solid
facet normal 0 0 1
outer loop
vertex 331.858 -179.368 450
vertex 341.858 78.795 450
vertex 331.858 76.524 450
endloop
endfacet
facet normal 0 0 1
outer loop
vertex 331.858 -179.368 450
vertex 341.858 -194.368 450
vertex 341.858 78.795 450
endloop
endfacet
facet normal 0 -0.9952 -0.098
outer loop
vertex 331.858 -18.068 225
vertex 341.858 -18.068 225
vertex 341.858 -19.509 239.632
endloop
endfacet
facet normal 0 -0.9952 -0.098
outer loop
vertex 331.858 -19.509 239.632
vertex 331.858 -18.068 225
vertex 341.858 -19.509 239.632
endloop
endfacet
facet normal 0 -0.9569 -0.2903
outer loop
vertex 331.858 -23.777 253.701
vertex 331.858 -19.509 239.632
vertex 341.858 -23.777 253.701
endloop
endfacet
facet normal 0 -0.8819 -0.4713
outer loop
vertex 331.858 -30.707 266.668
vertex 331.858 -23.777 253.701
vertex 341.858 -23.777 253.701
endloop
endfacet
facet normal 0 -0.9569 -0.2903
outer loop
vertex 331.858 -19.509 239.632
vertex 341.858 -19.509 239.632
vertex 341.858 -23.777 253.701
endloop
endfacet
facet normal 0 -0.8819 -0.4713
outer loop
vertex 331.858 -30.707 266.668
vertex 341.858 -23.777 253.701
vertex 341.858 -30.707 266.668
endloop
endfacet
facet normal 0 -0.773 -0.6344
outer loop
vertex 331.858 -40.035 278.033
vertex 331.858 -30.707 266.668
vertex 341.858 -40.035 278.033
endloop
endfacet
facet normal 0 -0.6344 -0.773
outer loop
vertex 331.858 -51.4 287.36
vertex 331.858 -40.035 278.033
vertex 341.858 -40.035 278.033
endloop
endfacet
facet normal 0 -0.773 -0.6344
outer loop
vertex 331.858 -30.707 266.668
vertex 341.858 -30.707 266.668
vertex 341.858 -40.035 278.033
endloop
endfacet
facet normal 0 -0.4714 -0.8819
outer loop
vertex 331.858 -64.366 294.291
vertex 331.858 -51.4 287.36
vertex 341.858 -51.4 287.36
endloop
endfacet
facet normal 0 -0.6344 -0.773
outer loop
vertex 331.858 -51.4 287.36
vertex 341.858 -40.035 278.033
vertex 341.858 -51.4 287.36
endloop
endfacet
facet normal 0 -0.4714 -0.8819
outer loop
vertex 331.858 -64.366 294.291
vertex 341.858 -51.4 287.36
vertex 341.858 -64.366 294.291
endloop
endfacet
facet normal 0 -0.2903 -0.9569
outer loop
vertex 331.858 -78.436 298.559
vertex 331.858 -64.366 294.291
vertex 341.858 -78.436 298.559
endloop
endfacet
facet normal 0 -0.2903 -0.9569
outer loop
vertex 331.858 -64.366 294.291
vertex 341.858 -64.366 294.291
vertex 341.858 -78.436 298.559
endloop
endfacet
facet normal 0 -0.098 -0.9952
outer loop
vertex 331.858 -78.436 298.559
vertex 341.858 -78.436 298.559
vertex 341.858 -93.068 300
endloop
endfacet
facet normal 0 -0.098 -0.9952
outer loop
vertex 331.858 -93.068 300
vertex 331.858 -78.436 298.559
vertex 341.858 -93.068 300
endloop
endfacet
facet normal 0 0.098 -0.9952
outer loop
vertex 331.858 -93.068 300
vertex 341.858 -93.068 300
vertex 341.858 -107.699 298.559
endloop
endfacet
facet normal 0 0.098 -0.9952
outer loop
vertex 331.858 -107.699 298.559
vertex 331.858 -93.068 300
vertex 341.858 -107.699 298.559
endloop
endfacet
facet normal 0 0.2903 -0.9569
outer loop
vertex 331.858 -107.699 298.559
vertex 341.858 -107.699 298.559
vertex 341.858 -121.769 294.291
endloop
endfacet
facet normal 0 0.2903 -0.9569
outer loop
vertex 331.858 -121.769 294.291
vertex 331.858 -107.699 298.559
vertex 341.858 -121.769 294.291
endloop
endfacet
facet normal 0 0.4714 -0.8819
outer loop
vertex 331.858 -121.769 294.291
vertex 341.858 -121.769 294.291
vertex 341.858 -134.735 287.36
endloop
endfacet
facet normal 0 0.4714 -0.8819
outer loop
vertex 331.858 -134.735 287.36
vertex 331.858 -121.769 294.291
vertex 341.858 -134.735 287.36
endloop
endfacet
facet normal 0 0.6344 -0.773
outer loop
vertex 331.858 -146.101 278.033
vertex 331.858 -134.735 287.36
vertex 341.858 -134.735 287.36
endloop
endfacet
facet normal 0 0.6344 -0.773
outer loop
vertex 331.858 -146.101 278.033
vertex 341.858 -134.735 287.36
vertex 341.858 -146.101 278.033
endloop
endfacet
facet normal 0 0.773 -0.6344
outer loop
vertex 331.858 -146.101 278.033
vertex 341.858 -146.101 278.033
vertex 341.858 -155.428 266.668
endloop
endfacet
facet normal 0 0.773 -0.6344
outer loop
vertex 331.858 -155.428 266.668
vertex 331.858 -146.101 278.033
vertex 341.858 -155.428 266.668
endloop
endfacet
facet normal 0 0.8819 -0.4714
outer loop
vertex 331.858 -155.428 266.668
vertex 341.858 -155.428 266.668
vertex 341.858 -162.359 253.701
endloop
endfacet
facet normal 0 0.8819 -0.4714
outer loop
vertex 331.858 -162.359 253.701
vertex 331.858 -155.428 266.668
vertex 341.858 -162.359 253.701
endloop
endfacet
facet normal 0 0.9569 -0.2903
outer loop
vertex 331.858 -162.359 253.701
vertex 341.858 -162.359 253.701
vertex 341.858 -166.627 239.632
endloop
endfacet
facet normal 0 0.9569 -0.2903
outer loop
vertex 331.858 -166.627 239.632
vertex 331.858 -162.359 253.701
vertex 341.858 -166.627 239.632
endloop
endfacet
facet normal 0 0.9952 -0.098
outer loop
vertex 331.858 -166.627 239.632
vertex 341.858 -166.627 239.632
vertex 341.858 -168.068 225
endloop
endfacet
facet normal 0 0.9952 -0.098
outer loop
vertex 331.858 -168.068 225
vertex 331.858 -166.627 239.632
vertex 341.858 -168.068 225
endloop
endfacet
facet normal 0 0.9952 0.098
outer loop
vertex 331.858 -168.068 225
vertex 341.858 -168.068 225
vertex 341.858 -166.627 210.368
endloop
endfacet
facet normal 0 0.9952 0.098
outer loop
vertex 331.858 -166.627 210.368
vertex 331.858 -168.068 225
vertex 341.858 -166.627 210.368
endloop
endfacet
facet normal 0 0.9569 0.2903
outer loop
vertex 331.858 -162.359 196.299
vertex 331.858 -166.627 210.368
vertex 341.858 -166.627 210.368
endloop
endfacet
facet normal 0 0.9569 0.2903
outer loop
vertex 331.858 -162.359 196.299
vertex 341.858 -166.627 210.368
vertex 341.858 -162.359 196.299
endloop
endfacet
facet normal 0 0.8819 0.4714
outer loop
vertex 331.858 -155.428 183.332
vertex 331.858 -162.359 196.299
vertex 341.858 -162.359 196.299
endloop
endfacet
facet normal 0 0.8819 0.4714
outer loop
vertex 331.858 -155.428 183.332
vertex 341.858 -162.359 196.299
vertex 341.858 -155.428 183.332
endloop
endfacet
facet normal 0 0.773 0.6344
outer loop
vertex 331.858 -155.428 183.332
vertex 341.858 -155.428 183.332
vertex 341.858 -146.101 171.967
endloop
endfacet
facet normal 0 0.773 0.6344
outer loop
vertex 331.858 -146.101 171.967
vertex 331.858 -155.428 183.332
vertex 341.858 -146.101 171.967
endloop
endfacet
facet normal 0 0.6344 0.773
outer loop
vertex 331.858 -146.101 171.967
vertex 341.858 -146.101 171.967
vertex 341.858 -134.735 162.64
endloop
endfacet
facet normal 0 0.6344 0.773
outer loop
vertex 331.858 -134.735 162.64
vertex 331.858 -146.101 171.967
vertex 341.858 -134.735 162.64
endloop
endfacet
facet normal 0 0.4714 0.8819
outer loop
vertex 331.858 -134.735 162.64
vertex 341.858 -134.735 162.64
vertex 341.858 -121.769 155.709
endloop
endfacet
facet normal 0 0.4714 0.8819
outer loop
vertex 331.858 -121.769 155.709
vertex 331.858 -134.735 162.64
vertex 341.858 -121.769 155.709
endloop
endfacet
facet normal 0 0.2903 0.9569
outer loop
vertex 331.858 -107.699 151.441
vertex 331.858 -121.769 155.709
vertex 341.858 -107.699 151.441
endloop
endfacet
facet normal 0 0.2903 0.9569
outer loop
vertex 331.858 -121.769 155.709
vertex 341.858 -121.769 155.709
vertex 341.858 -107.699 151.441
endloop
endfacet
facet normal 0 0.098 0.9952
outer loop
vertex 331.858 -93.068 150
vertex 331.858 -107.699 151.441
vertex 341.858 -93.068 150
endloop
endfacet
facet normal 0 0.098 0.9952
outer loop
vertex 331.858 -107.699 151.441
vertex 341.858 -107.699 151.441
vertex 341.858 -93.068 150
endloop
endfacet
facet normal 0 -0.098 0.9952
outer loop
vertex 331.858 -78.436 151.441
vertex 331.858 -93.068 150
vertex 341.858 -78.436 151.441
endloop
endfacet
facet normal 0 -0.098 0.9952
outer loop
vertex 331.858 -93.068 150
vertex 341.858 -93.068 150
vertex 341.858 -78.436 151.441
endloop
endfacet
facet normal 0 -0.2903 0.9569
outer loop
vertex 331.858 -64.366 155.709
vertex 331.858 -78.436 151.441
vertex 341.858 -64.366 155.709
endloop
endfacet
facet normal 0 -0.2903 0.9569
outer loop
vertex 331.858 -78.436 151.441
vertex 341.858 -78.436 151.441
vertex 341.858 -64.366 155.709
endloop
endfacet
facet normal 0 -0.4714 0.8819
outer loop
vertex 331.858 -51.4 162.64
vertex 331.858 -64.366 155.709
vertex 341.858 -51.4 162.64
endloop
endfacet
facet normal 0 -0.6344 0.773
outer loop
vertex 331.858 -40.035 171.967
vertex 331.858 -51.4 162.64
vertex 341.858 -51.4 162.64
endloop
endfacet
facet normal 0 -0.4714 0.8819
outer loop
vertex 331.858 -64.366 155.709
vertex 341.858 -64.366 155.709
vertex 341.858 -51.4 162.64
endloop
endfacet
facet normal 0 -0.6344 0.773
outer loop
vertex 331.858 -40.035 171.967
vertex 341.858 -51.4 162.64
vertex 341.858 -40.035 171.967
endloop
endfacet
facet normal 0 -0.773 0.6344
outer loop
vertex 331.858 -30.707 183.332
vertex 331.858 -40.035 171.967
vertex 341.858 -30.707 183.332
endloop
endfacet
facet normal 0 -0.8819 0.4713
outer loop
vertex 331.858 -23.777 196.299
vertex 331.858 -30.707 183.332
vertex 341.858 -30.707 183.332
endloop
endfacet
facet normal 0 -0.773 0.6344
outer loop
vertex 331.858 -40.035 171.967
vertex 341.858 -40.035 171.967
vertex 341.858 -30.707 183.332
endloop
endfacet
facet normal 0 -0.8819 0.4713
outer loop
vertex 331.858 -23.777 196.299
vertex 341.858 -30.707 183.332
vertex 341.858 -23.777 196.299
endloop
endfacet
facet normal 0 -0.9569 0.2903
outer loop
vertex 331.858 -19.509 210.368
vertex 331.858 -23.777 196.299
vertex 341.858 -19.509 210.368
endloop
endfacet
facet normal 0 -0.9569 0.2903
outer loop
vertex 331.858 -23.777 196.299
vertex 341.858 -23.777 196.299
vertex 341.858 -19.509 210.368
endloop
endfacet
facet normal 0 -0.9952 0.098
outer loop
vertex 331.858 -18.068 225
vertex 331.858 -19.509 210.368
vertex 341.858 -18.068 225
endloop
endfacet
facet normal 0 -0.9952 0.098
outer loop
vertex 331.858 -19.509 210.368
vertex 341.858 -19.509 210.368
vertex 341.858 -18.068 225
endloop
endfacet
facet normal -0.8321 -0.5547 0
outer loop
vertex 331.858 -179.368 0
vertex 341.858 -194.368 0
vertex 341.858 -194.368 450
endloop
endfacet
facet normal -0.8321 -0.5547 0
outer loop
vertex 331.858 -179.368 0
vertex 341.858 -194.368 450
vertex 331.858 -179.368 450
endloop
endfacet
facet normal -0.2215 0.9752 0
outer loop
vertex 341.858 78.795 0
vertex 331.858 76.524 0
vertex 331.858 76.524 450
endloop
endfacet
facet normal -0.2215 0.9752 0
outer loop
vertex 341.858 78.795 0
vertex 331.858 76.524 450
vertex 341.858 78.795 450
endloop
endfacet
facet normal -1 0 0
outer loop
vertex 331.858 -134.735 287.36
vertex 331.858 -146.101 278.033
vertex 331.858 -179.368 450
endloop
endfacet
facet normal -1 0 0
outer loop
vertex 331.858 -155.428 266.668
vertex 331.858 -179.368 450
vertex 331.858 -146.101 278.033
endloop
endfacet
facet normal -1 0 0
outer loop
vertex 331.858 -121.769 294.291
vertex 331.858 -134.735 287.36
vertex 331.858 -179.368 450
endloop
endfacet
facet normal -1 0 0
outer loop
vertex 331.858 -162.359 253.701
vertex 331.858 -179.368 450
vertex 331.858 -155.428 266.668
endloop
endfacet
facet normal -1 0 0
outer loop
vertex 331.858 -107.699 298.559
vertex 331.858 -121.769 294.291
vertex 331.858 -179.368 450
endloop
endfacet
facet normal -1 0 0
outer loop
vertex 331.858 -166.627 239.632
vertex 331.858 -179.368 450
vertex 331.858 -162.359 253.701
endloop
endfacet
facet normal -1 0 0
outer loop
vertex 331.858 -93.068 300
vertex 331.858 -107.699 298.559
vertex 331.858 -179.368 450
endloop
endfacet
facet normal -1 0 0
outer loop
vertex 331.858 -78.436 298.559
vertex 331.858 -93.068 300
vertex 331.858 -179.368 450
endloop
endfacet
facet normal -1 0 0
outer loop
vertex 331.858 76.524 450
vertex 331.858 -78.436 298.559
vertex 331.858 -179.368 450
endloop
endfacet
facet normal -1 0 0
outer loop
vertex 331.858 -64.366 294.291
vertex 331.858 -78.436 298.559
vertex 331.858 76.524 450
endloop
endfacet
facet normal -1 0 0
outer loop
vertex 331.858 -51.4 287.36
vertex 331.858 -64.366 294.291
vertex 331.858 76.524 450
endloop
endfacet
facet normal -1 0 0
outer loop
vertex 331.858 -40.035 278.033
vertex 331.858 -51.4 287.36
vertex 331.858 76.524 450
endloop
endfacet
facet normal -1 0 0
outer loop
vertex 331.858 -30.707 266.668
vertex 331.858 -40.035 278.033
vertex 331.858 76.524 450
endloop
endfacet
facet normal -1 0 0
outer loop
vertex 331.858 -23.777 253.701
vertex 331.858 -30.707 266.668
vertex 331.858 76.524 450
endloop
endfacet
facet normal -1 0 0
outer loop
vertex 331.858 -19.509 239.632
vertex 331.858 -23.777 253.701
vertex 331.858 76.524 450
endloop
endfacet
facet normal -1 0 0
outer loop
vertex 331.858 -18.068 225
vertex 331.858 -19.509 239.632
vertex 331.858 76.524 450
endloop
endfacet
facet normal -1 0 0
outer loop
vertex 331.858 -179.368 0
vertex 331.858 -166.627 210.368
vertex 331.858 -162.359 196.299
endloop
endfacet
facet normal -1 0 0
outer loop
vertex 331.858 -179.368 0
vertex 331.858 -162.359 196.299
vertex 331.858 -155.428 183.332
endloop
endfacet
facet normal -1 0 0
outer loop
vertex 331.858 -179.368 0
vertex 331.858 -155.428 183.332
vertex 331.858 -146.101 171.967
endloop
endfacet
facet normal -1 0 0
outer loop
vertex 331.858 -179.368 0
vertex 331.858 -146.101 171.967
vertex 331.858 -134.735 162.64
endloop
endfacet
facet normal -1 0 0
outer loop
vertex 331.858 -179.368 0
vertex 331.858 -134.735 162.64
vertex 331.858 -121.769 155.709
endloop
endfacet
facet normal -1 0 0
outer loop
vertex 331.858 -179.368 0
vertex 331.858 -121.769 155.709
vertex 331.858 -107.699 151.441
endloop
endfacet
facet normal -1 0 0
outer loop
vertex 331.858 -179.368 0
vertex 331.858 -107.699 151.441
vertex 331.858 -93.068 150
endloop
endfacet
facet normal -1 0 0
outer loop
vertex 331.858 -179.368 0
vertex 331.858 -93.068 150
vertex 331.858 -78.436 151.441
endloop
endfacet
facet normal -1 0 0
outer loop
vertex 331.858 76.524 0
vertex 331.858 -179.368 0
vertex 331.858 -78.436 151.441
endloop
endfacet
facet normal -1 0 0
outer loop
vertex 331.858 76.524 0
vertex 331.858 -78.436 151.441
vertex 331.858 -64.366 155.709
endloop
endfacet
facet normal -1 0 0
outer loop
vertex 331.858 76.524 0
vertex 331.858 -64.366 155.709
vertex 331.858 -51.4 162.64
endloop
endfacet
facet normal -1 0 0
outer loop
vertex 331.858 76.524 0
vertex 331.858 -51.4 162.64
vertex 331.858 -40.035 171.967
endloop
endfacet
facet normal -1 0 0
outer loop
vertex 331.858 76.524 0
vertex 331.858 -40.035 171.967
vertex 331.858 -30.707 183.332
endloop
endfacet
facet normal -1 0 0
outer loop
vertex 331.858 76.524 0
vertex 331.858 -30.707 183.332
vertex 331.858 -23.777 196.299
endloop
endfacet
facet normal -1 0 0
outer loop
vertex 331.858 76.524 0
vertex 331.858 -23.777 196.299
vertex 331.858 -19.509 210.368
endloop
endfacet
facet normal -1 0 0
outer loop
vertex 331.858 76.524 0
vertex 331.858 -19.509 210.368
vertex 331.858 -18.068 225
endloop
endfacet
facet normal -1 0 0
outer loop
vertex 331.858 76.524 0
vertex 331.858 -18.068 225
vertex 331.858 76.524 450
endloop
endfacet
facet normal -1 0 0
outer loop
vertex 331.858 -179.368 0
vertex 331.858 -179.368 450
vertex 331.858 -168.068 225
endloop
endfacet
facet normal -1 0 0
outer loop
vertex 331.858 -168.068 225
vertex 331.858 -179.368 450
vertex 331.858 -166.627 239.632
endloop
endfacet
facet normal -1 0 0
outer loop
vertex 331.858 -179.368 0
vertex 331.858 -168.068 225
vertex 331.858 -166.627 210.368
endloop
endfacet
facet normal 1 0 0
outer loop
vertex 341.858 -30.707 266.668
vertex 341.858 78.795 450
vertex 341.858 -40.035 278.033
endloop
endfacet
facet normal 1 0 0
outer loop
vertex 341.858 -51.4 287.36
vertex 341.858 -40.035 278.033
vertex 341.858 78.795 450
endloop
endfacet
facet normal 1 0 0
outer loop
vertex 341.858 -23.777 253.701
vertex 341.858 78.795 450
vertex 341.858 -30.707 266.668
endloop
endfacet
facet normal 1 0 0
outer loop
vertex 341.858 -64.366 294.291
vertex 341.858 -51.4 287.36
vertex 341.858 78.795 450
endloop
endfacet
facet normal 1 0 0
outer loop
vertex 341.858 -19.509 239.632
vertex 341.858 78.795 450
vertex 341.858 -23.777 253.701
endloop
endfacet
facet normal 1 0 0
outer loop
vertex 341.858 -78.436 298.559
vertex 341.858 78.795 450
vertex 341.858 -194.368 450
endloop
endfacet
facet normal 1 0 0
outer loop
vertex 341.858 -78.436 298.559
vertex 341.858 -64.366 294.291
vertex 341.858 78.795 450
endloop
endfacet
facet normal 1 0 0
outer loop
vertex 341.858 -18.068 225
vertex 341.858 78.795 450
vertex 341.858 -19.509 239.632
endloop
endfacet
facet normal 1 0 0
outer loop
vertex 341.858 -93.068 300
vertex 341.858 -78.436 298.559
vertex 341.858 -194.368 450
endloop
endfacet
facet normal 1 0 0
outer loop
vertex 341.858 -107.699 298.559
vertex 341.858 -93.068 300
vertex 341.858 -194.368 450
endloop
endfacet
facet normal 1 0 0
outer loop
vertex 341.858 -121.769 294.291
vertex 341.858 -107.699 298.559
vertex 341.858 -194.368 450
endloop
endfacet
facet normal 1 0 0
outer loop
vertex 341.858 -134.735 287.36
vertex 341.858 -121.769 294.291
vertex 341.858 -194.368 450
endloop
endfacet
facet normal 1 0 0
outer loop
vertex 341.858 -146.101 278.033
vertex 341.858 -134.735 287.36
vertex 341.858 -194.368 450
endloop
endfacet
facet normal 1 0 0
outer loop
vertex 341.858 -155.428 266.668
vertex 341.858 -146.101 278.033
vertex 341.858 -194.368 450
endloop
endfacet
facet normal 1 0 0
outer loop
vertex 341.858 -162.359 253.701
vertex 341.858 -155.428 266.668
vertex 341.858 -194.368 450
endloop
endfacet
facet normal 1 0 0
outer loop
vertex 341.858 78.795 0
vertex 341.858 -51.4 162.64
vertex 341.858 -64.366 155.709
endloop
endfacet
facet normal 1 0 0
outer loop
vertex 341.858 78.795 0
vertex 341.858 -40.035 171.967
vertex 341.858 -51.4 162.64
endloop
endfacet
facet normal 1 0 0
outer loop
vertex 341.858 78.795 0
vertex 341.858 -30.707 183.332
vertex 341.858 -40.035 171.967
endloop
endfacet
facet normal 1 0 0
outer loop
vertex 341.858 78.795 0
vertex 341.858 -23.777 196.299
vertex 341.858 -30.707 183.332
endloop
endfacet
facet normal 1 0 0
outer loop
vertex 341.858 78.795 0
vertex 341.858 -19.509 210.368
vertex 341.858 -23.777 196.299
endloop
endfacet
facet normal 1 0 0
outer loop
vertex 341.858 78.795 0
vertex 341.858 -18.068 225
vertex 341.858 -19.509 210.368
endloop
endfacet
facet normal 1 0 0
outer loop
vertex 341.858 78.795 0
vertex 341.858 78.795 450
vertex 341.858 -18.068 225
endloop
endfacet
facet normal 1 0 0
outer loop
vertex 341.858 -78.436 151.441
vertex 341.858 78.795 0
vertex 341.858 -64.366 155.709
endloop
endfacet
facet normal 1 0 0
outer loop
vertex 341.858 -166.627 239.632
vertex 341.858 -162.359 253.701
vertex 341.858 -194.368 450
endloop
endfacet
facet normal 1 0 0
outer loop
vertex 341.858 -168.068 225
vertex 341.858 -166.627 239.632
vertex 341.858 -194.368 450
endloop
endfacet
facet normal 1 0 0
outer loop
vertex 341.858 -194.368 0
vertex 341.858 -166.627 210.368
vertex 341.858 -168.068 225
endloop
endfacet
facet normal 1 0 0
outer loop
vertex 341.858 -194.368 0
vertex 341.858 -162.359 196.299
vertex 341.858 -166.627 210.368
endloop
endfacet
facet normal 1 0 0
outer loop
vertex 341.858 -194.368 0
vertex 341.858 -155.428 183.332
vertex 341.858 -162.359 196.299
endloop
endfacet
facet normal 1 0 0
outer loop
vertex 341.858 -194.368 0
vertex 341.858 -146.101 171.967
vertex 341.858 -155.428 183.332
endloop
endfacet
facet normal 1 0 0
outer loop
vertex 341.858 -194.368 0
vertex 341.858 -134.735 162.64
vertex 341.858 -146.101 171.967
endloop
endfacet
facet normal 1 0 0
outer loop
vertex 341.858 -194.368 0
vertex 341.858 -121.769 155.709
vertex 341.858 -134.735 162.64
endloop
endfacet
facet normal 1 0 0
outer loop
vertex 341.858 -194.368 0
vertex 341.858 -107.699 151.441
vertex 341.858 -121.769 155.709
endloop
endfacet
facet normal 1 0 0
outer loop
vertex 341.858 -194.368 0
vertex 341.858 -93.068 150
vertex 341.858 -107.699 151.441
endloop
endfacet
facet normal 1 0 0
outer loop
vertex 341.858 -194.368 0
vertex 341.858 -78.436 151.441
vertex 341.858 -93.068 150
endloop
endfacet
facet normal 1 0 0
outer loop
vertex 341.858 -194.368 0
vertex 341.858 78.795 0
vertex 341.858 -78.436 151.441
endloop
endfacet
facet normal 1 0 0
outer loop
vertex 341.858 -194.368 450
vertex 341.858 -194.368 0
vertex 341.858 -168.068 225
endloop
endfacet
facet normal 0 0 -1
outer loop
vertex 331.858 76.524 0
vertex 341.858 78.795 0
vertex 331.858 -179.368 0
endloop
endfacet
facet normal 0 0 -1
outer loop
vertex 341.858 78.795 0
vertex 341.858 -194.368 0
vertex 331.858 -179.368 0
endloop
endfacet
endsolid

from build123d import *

# Parameters (mm, degrees)
AUFSATZ_LINEAR_AUSTRAGEN1_DEPTH  = 450
F_15_0_15_DURCHMESSER_BOHRUNG1_D = 150


with BuildPart() as part:
    # Skizze1 → Aufsatz-Linear austragen1 (new body)
    with BuildSketch(Plane.XY):
        Polygon((331.858259494, 76.52367356), (341.858259494, 78.794563683), (341.858259494, -194.367647059), (331.858259494, -179.367647059), align=None)
    extrude(amount=AUFSATZ_LINEAR_AUSTRAGEN1_DEPTH)

    # Ø15.0 (15) Durchmesser Bohrung1 (through all)
    with Locations(Plane(origin=(331.858259494, -93.067647059, 225), x_dir=(0, -1, 0), z_dir=(-1, 0, 0))):
        with Locations((0, 0)):
            Hole(F_15_0_15_DURCHMESSER_BOHRUNG1_D / 2)


solid = part.part
